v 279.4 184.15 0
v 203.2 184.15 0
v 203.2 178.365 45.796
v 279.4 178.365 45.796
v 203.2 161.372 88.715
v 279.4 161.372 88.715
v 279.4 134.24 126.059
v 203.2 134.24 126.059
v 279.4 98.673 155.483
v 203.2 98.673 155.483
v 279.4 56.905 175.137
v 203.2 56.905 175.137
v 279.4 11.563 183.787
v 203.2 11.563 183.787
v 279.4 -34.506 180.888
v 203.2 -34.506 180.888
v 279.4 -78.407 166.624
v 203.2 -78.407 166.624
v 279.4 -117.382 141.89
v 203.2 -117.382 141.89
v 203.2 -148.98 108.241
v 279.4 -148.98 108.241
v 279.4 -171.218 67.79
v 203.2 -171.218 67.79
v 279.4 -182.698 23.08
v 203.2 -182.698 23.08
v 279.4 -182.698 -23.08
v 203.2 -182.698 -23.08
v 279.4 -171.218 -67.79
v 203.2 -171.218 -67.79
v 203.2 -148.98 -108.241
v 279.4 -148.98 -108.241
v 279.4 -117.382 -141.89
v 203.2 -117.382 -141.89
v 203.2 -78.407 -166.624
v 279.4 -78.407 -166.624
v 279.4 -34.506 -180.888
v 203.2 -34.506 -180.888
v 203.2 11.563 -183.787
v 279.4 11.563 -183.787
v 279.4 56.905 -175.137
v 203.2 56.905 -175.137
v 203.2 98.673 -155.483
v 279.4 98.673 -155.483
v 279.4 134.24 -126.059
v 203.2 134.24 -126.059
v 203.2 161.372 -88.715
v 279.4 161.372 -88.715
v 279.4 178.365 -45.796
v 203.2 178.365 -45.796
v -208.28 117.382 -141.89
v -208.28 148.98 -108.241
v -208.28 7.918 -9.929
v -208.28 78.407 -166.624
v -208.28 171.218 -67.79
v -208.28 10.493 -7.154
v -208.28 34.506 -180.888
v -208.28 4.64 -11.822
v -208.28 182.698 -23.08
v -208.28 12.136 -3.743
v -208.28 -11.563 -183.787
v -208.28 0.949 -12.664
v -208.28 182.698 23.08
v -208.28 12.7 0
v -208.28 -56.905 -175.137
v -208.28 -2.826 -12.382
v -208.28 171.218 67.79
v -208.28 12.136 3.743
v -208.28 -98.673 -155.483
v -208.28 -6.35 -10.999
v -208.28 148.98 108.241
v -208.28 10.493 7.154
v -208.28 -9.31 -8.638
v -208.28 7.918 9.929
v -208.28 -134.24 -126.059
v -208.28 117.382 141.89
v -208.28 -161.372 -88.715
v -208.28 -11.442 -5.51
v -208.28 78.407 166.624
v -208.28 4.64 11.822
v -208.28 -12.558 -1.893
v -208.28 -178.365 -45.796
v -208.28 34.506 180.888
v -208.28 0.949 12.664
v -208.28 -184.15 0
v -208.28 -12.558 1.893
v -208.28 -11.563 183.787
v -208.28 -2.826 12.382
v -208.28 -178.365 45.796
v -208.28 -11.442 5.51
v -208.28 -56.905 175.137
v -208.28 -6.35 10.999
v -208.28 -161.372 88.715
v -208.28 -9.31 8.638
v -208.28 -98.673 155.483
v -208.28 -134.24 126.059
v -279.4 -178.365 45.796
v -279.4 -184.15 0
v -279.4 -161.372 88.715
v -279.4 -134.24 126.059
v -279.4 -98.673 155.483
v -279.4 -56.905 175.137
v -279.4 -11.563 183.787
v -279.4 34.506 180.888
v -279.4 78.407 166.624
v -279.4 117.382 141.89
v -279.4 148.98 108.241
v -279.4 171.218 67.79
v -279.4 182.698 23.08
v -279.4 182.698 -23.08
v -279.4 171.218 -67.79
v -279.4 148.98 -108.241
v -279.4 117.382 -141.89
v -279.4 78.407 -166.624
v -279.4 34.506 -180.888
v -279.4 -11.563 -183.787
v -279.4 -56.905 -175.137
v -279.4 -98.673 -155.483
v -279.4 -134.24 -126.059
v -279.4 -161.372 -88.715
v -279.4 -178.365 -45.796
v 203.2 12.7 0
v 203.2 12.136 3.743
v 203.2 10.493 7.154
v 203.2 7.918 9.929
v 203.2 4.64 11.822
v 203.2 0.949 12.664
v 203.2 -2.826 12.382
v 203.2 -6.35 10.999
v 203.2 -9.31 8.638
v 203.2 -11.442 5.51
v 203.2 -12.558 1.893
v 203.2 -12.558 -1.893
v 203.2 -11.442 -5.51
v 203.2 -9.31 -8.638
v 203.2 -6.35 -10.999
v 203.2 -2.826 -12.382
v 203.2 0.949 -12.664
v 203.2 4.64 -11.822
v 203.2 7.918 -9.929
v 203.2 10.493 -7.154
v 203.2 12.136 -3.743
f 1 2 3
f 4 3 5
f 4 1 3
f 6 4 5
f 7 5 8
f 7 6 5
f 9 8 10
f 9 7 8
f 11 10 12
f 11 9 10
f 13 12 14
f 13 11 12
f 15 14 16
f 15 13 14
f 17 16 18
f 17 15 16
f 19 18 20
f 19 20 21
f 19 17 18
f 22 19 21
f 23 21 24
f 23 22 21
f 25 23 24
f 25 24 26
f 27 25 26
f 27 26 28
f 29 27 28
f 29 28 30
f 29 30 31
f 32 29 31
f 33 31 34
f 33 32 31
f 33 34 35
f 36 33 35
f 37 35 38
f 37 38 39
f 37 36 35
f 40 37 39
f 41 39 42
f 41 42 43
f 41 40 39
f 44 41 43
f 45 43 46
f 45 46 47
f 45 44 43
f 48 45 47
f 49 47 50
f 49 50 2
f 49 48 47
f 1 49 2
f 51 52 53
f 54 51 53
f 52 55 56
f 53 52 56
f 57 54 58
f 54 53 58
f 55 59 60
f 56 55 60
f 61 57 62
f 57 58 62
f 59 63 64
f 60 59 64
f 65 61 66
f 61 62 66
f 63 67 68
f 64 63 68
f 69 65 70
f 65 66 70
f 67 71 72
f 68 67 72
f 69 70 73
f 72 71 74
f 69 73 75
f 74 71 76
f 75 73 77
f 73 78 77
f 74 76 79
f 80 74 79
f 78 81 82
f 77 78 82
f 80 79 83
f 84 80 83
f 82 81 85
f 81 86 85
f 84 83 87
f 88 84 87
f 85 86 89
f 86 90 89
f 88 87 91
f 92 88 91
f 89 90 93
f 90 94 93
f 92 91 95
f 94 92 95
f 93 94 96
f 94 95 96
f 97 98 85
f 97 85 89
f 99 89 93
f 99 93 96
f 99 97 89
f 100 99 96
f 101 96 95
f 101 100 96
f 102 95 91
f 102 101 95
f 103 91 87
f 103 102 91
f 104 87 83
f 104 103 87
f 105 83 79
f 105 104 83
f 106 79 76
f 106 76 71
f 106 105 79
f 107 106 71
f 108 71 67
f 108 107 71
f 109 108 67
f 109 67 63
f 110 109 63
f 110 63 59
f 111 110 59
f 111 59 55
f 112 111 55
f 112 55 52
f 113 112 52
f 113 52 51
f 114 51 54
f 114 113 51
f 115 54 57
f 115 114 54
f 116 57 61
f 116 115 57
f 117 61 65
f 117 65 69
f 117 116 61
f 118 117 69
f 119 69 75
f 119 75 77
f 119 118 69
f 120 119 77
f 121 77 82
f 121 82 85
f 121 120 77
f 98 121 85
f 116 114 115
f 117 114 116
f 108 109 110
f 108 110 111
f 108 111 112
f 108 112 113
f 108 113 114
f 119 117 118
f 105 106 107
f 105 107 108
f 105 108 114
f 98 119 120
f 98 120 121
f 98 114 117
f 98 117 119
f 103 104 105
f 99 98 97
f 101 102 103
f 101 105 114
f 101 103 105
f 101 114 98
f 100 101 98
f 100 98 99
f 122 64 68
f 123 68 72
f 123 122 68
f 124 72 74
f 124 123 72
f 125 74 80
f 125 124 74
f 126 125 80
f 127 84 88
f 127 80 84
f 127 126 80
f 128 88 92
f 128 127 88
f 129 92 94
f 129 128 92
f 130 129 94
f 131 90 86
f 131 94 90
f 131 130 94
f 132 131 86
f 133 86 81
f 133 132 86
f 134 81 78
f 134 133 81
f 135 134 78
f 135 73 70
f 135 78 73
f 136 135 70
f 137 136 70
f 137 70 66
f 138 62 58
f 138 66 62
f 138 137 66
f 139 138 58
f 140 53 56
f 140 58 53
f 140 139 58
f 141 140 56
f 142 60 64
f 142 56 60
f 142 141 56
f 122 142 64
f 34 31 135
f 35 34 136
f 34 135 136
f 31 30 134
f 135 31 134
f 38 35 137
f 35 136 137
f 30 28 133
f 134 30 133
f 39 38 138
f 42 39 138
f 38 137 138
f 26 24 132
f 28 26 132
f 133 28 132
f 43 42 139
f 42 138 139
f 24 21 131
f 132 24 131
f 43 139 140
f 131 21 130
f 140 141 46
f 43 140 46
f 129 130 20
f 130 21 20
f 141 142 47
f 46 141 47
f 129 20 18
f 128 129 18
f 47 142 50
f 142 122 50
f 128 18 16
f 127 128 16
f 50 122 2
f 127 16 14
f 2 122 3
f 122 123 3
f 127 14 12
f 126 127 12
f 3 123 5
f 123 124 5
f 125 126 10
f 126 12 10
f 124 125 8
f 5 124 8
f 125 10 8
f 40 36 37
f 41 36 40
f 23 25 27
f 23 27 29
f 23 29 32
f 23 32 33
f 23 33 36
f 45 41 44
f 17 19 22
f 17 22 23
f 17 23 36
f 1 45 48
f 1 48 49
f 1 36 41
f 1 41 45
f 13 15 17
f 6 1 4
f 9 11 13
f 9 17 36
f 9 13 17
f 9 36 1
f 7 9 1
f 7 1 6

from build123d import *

# Parameters (mm, degrees)
F0_R     = 12.7
F1_DEPTH = 279.4
F2_R     = 184.15
F2_R_2   = 12.7
F3_DEPTH = 76.2
F4_R     = 184.15
F4_R_2   = 12.7
F5_DEPTH = 71.12


with BuildPart() as f1:
    # F0 (on Right) → F1 (new body, symmetric)
    with BuildSketch(Plane.YZ):
        Circle(F0_R)
    extrude(amount=F1_DEPTH, both=True)

    # F2 (on face) → F3 (join)
    with BuildSketch(Plane.YZ.offset(279.4)):
        Circle(F2_R)
        Circle(F2_R_2, mode=Mode.SUBTRACT)
    extrude(amount=-F3_DEPTH)

    # F4 (on face) → F5 (join)
    with BuildSketch(Plane(origin=(-279.4, 0, 0), x_dir=(0, -1, 0), z_dir=(-1, 0, 0))):
        Circle(F4_R)
        Circle(F4_R_2, mode=Mode.SUBTRACT)
    extrude(amount=-F5_DEPTH)


solid = f1.part
